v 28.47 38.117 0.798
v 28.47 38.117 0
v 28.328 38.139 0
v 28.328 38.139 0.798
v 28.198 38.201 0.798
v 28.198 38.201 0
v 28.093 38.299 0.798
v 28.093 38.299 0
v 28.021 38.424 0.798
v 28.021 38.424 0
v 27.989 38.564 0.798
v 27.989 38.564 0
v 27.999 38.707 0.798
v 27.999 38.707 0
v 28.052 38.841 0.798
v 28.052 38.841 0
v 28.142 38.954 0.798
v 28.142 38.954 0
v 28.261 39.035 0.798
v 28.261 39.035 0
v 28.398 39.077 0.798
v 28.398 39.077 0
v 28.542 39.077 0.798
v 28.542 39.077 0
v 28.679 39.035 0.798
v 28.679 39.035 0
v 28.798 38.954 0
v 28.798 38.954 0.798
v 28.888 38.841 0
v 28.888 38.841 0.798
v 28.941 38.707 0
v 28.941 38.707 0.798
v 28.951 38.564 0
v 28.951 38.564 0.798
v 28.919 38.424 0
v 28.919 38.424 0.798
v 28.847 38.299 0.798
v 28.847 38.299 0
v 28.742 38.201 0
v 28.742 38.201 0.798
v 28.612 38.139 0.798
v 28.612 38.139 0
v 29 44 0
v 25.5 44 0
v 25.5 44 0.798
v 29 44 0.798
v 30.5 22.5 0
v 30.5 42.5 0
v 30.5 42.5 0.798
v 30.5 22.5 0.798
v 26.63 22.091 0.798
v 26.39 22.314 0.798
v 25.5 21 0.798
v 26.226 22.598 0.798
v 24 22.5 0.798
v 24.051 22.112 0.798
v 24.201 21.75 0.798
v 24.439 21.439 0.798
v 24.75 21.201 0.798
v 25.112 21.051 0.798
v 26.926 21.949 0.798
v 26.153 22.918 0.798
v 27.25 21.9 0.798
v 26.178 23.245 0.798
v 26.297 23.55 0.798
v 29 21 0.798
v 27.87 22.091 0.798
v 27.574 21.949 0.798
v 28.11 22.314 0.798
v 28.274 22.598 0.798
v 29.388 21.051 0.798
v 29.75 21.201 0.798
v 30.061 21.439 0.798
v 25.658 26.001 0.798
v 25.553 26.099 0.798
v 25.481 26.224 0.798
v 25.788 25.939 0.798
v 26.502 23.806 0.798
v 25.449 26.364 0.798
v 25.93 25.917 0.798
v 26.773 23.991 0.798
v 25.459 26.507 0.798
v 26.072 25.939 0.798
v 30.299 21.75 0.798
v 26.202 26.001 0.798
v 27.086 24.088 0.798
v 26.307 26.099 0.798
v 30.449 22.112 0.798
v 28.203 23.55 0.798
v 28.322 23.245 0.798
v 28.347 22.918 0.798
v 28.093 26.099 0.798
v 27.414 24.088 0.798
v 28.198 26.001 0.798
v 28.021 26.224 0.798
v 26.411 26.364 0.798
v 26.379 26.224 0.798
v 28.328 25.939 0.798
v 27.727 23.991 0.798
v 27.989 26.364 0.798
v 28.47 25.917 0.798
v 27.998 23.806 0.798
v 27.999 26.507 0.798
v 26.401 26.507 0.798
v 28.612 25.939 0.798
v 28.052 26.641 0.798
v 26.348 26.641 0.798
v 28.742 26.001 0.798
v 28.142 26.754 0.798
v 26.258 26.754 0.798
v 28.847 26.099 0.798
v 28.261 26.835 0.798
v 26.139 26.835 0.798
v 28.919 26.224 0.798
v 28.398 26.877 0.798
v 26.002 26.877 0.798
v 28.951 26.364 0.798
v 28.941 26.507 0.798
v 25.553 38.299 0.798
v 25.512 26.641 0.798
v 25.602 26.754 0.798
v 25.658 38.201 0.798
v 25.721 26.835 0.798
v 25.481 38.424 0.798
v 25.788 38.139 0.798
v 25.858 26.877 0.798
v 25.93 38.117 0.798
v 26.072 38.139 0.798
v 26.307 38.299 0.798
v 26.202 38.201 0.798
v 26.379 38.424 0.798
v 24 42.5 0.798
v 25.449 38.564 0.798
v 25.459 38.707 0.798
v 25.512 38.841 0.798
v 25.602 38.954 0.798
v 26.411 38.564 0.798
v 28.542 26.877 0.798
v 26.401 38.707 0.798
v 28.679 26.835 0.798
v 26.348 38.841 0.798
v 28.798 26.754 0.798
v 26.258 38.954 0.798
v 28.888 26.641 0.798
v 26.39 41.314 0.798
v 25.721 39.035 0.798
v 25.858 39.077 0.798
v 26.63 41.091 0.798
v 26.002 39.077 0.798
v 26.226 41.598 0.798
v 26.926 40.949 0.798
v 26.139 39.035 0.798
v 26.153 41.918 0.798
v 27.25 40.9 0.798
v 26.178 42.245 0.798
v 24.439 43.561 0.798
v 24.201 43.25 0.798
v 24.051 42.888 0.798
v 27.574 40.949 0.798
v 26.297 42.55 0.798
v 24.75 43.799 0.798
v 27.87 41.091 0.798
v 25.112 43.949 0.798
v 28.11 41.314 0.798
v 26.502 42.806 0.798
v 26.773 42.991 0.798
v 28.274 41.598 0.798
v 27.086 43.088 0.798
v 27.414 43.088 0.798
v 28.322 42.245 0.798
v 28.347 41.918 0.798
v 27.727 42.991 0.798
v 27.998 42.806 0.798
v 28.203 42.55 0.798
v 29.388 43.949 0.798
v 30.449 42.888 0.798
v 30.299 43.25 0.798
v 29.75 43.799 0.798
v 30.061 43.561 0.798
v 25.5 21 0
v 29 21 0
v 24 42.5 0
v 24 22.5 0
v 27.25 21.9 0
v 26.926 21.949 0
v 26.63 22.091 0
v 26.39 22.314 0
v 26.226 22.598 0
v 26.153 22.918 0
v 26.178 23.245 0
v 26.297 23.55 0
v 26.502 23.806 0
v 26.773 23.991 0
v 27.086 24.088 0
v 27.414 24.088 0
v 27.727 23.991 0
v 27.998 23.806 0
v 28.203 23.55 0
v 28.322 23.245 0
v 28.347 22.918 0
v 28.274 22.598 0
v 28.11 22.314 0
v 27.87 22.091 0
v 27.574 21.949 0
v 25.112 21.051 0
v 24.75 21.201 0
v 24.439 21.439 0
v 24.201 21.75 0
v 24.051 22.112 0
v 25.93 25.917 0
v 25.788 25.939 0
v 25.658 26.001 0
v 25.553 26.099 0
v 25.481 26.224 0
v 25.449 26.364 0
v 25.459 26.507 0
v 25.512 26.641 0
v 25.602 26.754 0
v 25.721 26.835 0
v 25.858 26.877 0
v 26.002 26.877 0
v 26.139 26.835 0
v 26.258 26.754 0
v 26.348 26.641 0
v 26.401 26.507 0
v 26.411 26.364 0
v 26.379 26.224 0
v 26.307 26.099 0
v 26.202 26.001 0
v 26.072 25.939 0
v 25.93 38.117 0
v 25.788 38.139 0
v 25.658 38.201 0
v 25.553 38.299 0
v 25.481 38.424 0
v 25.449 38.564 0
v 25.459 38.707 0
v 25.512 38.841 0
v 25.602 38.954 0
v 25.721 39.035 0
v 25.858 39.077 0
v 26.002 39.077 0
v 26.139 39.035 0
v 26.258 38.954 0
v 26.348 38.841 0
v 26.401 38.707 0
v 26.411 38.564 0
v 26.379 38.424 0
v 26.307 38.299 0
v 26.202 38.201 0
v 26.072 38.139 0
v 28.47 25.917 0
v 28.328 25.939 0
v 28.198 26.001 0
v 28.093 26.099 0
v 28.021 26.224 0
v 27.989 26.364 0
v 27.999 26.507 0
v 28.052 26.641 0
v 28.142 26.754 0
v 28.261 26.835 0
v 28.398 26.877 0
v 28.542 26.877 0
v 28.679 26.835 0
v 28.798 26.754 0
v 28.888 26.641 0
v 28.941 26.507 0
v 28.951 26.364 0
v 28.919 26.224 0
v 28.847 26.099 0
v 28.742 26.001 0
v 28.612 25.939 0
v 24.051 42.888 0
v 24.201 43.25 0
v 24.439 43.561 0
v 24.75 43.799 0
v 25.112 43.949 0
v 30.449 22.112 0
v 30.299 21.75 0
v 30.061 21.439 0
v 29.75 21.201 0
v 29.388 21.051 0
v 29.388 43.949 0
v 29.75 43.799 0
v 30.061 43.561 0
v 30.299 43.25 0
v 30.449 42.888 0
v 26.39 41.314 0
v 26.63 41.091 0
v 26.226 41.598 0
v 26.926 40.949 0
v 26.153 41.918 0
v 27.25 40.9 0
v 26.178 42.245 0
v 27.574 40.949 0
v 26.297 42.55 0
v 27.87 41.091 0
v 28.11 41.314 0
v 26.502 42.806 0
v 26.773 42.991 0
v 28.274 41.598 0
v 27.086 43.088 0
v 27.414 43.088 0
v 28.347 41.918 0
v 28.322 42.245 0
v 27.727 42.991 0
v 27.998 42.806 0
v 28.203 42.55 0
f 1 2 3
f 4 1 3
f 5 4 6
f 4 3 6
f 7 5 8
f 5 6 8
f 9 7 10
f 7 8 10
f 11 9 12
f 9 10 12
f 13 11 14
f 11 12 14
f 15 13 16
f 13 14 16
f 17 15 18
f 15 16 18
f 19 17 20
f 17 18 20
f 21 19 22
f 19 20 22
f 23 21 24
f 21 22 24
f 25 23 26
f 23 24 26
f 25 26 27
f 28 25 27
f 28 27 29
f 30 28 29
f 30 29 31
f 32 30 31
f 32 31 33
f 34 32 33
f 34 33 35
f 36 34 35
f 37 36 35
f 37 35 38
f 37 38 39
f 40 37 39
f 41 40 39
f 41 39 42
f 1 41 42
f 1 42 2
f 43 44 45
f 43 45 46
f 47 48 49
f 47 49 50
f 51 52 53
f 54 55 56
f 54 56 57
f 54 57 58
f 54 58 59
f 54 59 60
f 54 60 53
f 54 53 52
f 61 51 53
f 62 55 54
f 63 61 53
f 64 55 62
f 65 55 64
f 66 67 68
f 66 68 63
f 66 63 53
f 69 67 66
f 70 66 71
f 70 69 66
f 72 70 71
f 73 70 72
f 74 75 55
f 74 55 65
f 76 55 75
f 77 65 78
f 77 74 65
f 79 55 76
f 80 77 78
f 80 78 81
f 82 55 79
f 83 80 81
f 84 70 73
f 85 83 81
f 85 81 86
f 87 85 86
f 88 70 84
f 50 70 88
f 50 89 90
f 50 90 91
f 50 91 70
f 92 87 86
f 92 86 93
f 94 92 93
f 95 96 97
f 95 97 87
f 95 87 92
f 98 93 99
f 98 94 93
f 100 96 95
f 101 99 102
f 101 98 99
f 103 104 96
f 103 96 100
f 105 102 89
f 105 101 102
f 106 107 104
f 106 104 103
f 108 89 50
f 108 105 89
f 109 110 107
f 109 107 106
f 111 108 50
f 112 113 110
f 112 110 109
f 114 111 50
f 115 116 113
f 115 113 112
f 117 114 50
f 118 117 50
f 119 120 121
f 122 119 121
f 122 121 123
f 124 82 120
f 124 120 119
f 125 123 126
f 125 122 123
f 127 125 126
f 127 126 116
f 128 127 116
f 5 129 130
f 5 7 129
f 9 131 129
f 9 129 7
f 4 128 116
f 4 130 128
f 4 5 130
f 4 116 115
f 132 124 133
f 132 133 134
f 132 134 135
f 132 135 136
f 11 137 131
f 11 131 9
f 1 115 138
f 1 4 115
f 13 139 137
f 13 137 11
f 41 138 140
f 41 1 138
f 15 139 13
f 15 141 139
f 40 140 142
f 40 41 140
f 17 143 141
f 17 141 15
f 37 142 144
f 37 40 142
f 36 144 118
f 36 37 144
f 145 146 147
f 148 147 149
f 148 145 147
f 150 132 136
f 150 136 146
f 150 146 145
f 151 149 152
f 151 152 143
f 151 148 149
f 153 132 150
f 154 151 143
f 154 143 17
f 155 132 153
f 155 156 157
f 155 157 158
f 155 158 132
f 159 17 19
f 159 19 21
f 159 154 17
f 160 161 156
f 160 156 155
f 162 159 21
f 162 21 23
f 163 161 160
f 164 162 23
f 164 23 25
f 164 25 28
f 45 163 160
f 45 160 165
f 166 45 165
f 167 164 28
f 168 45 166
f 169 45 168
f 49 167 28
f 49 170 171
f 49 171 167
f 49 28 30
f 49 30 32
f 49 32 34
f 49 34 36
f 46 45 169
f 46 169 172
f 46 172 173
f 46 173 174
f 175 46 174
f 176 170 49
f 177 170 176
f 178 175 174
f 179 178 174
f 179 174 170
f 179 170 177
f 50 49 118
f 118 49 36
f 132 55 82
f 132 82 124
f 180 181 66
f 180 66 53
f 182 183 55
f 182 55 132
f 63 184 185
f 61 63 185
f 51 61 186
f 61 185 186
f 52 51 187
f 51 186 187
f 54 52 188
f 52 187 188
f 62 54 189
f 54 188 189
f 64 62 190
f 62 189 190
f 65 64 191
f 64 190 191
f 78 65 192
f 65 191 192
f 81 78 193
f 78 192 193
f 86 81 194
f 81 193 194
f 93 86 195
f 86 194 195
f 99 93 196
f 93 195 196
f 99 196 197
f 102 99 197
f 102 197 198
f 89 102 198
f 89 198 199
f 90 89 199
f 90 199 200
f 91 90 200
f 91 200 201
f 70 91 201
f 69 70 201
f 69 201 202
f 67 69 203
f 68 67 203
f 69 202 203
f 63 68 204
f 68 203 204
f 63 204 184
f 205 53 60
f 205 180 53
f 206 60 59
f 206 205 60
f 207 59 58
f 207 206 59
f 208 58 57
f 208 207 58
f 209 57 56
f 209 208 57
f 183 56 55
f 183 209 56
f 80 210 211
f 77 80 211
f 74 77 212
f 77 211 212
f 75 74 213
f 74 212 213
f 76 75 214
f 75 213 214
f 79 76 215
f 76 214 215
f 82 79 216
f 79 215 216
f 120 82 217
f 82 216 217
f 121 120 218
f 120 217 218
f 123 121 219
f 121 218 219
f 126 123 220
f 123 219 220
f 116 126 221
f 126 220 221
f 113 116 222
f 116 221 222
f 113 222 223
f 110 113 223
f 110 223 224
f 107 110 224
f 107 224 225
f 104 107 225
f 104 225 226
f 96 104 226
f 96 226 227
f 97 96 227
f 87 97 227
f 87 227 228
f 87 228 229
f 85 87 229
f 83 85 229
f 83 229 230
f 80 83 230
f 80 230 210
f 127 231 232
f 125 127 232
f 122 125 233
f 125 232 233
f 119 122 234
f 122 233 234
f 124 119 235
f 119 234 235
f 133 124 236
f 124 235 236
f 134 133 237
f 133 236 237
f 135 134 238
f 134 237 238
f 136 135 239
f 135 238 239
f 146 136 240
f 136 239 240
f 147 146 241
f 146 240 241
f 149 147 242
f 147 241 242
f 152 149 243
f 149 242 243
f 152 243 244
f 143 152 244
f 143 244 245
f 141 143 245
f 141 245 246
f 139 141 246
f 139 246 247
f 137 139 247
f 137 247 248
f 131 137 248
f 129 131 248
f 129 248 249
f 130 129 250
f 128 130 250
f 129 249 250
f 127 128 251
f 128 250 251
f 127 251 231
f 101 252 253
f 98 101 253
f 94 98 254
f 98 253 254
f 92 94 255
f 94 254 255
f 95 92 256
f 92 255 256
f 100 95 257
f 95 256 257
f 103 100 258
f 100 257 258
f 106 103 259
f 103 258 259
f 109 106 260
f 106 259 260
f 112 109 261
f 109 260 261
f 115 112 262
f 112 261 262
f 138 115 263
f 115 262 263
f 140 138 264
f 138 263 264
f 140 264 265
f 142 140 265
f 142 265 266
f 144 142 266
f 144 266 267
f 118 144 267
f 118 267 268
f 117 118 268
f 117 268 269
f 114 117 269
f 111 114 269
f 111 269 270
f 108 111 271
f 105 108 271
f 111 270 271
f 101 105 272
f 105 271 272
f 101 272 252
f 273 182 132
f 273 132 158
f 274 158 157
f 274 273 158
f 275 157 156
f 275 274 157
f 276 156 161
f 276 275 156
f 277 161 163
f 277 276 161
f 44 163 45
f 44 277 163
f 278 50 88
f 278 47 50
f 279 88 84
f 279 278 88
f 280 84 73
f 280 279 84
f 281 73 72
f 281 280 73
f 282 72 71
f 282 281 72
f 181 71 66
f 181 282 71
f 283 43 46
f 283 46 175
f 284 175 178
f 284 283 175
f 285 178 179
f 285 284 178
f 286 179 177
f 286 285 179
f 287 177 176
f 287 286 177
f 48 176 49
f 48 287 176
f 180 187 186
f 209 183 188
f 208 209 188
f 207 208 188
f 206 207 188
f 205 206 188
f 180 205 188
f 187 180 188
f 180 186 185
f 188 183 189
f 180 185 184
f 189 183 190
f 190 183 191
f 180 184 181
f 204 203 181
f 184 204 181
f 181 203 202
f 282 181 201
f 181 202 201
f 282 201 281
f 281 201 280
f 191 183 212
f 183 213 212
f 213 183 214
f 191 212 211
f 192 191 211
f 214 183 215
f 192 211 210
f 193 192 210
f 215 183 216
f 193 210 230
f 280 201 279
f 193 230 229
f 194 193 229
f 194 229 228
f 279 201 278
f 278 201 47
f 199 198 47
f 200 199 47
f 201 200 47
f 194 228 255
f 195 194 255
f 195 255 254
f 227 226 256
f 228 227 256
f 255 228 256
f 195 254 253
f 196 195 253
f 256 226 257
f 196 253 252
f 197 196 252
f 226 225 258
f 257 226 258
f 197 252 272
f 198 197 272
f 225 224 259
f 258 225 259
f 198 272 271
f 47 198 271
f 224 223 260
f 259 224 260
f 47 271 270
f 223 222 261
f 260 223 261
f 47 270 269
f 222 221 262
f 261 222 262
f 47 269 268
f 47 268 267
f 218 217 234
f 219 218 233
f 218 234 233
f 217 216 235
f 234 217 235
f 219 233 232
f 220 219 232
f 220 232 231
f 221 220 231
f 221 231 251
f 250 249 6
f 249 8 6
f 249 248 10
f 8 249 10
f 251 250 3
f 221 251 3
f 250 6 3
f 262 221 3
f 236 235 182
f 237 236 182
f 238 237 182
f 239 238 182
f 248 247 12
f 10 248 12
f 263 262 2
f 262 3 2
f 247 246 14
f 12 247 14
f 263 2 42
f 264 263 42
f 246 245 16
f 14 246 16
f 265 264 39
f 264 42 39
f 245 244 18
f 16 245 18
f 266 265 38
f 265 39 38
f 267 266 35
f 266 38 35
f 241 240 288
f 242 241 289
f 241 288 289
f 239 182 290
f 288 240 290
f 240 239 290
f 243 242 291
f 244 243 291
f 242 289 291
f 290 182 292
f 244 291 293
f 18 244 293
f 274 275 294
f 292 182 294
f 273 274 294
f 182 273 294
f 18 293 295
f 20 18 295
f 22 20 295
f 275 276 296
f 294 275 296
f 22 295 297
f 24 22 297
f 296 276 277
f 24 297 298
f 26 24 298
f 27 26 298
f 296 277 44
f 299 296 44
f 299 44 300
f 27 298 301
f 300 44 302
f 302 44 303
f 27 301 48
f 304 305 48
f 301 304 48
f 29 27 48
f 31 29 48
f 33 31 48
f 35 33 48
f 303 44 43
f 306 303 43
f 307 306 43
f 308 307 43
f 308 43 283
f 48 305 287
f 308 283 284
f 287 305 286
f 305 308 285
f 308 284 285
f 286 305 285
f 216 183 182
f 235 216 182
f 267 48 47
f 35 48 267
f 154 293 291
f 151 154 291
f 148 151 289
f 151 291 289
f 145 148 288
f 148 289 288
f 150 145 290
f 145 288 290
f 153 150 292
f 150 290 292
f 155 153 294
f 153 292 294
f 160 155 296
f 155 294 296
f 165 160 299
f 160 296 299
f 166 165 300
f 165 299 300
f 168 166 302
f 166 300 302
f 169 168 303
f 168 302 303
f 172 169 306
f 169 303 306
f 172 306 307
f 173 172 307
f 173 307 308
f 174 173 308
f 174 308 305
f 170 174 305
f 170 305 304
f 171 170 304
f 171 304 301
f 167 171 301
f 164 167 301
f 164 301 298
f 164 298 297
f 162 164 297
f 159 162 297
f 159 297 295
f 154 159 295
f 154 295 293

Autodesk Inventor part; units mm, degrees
ref_plane "YZ Plane" through (0, 0, 0) normal (1, 0, 0) x (0, 1, 0)
ref_plane "XZ Plane" through (0, 0, 0) normal (0, 1, 0) x (-1, 0, 0)
ref_plane "BoardFrontPlane" through (0, 0, 0) normal (0, 0, 1) x (1, 0, 0)
sketch "Sketch1" plane through (0, 0, 0) normal (0, 0, 1) x (1, 0, 0)
  line L0 (24, 22.5) -> (24, 42.5)
  arc A0 (25.5, 44) -> (24, 42.5) centre (25.5, 42.5) ccw
  line L1 (25.5, 44) -> (29, 44)
  arc A1 (30.5, 42.5) -> (29, 44) centre (29, 42.5) ccw
  line L2 (30.5, 42.5) -> (30.5, 22.5)
  arc A2 (29, 21) -> (30.5, 22.5) centre (29, 22.5) ccw
  line L3 (29, 21) -> (25.5, 21)
  arc A3 (24, 22.5) -> (25.5, 21) centre (25.5, 22.5) ccw
extrude "BoardOutline" add sketch "Sketch1" along normal blind 0.798
sketch "img_Top" plane through (0, 0, 0.798) normal (0, 0, 1) x (1, 0, 0)
  line L0 (24, 44) -> (30.4988, 44) construction
  line L1 (30.4988, 44) -> (30.4988, 21) construction
  line L2 (30.4988, 21) -> (24, 21) construction
  line L3 (24, 21) -> (24, 44) construction
decal "Decal_Top"
sketch "img_Bottom" plane through (0, 0, -0.798) normal (0, 0, -1) x (1, 0, 0)
  line L0 (24, -21) -> (30.4988, -21) construction
  line L1 (30.4988, -21) -> (30.4988, -44) construction
  line L2 (30.4988, -44) -> (24, -44) construction
  line L3 (24, -44) -> (24, -21) construction
decal "Decal_Bottom"
sketch "Sketch4" plane through (0, 0, 0.798) normal (0, 0, 1) x (1, 0, 0)
  point P0 (28.47, 26.4)
hole "Q1-2" at (28.47, 26.4, 0.798) direction (0, 0, -1) diameter 0.9652 end through all
sketch "Sketch5" plane through (0, 0, 0.798) normal (0, 0, 1) x (1, 0, 0)
  point P0 (25.93, 26.4)
hole "Q1-1" at (25.93, 26.4, 0.798) direction (0, 0, -1) diameter 0.9652 end through all
sketch "Sketch6" plane through (0, 0, 0.798) normal (0, 0, 1) x (1, 0, 0)
  point P0 (28.47, 38.6)
hole "LED1-1" at (28.47, 38.6, 0.798) direction (0, 0, -1) diameter 0.9652 end through all
sketch "Sketch7" plane through (0, 0, 0.798) normal (0, 0, 1) x (1, 0, 0)
  point P0 (25.93, 38.6)
hole "LED1-2" at (25.93, 38.6, 0.798) direction (0, 0, -1) diameter 0.9652 end through all
sketch "Sketch8" plane through (0, 0, 0.798) normal (0, 0, 1) x (1, 0, 0)
  point P0 (27.25, 42)
hole "Free-MP2" at (27.25, 42, 0.798) direction (0, 0, -1) diameter 2.2 end through all
sketch "Sketch9" plane through (0, 0, 0.798) normal (0, 0, 1) x (1, 0, 0)
  point P0 (27.25, 23)
hole "Free-MP1" at (27.25, 23, 0.798) direction (0, 0, -1) diameter 2.2 end through all
properties part number "ND.ForageFeeder.BeamBreak_BOARD"
